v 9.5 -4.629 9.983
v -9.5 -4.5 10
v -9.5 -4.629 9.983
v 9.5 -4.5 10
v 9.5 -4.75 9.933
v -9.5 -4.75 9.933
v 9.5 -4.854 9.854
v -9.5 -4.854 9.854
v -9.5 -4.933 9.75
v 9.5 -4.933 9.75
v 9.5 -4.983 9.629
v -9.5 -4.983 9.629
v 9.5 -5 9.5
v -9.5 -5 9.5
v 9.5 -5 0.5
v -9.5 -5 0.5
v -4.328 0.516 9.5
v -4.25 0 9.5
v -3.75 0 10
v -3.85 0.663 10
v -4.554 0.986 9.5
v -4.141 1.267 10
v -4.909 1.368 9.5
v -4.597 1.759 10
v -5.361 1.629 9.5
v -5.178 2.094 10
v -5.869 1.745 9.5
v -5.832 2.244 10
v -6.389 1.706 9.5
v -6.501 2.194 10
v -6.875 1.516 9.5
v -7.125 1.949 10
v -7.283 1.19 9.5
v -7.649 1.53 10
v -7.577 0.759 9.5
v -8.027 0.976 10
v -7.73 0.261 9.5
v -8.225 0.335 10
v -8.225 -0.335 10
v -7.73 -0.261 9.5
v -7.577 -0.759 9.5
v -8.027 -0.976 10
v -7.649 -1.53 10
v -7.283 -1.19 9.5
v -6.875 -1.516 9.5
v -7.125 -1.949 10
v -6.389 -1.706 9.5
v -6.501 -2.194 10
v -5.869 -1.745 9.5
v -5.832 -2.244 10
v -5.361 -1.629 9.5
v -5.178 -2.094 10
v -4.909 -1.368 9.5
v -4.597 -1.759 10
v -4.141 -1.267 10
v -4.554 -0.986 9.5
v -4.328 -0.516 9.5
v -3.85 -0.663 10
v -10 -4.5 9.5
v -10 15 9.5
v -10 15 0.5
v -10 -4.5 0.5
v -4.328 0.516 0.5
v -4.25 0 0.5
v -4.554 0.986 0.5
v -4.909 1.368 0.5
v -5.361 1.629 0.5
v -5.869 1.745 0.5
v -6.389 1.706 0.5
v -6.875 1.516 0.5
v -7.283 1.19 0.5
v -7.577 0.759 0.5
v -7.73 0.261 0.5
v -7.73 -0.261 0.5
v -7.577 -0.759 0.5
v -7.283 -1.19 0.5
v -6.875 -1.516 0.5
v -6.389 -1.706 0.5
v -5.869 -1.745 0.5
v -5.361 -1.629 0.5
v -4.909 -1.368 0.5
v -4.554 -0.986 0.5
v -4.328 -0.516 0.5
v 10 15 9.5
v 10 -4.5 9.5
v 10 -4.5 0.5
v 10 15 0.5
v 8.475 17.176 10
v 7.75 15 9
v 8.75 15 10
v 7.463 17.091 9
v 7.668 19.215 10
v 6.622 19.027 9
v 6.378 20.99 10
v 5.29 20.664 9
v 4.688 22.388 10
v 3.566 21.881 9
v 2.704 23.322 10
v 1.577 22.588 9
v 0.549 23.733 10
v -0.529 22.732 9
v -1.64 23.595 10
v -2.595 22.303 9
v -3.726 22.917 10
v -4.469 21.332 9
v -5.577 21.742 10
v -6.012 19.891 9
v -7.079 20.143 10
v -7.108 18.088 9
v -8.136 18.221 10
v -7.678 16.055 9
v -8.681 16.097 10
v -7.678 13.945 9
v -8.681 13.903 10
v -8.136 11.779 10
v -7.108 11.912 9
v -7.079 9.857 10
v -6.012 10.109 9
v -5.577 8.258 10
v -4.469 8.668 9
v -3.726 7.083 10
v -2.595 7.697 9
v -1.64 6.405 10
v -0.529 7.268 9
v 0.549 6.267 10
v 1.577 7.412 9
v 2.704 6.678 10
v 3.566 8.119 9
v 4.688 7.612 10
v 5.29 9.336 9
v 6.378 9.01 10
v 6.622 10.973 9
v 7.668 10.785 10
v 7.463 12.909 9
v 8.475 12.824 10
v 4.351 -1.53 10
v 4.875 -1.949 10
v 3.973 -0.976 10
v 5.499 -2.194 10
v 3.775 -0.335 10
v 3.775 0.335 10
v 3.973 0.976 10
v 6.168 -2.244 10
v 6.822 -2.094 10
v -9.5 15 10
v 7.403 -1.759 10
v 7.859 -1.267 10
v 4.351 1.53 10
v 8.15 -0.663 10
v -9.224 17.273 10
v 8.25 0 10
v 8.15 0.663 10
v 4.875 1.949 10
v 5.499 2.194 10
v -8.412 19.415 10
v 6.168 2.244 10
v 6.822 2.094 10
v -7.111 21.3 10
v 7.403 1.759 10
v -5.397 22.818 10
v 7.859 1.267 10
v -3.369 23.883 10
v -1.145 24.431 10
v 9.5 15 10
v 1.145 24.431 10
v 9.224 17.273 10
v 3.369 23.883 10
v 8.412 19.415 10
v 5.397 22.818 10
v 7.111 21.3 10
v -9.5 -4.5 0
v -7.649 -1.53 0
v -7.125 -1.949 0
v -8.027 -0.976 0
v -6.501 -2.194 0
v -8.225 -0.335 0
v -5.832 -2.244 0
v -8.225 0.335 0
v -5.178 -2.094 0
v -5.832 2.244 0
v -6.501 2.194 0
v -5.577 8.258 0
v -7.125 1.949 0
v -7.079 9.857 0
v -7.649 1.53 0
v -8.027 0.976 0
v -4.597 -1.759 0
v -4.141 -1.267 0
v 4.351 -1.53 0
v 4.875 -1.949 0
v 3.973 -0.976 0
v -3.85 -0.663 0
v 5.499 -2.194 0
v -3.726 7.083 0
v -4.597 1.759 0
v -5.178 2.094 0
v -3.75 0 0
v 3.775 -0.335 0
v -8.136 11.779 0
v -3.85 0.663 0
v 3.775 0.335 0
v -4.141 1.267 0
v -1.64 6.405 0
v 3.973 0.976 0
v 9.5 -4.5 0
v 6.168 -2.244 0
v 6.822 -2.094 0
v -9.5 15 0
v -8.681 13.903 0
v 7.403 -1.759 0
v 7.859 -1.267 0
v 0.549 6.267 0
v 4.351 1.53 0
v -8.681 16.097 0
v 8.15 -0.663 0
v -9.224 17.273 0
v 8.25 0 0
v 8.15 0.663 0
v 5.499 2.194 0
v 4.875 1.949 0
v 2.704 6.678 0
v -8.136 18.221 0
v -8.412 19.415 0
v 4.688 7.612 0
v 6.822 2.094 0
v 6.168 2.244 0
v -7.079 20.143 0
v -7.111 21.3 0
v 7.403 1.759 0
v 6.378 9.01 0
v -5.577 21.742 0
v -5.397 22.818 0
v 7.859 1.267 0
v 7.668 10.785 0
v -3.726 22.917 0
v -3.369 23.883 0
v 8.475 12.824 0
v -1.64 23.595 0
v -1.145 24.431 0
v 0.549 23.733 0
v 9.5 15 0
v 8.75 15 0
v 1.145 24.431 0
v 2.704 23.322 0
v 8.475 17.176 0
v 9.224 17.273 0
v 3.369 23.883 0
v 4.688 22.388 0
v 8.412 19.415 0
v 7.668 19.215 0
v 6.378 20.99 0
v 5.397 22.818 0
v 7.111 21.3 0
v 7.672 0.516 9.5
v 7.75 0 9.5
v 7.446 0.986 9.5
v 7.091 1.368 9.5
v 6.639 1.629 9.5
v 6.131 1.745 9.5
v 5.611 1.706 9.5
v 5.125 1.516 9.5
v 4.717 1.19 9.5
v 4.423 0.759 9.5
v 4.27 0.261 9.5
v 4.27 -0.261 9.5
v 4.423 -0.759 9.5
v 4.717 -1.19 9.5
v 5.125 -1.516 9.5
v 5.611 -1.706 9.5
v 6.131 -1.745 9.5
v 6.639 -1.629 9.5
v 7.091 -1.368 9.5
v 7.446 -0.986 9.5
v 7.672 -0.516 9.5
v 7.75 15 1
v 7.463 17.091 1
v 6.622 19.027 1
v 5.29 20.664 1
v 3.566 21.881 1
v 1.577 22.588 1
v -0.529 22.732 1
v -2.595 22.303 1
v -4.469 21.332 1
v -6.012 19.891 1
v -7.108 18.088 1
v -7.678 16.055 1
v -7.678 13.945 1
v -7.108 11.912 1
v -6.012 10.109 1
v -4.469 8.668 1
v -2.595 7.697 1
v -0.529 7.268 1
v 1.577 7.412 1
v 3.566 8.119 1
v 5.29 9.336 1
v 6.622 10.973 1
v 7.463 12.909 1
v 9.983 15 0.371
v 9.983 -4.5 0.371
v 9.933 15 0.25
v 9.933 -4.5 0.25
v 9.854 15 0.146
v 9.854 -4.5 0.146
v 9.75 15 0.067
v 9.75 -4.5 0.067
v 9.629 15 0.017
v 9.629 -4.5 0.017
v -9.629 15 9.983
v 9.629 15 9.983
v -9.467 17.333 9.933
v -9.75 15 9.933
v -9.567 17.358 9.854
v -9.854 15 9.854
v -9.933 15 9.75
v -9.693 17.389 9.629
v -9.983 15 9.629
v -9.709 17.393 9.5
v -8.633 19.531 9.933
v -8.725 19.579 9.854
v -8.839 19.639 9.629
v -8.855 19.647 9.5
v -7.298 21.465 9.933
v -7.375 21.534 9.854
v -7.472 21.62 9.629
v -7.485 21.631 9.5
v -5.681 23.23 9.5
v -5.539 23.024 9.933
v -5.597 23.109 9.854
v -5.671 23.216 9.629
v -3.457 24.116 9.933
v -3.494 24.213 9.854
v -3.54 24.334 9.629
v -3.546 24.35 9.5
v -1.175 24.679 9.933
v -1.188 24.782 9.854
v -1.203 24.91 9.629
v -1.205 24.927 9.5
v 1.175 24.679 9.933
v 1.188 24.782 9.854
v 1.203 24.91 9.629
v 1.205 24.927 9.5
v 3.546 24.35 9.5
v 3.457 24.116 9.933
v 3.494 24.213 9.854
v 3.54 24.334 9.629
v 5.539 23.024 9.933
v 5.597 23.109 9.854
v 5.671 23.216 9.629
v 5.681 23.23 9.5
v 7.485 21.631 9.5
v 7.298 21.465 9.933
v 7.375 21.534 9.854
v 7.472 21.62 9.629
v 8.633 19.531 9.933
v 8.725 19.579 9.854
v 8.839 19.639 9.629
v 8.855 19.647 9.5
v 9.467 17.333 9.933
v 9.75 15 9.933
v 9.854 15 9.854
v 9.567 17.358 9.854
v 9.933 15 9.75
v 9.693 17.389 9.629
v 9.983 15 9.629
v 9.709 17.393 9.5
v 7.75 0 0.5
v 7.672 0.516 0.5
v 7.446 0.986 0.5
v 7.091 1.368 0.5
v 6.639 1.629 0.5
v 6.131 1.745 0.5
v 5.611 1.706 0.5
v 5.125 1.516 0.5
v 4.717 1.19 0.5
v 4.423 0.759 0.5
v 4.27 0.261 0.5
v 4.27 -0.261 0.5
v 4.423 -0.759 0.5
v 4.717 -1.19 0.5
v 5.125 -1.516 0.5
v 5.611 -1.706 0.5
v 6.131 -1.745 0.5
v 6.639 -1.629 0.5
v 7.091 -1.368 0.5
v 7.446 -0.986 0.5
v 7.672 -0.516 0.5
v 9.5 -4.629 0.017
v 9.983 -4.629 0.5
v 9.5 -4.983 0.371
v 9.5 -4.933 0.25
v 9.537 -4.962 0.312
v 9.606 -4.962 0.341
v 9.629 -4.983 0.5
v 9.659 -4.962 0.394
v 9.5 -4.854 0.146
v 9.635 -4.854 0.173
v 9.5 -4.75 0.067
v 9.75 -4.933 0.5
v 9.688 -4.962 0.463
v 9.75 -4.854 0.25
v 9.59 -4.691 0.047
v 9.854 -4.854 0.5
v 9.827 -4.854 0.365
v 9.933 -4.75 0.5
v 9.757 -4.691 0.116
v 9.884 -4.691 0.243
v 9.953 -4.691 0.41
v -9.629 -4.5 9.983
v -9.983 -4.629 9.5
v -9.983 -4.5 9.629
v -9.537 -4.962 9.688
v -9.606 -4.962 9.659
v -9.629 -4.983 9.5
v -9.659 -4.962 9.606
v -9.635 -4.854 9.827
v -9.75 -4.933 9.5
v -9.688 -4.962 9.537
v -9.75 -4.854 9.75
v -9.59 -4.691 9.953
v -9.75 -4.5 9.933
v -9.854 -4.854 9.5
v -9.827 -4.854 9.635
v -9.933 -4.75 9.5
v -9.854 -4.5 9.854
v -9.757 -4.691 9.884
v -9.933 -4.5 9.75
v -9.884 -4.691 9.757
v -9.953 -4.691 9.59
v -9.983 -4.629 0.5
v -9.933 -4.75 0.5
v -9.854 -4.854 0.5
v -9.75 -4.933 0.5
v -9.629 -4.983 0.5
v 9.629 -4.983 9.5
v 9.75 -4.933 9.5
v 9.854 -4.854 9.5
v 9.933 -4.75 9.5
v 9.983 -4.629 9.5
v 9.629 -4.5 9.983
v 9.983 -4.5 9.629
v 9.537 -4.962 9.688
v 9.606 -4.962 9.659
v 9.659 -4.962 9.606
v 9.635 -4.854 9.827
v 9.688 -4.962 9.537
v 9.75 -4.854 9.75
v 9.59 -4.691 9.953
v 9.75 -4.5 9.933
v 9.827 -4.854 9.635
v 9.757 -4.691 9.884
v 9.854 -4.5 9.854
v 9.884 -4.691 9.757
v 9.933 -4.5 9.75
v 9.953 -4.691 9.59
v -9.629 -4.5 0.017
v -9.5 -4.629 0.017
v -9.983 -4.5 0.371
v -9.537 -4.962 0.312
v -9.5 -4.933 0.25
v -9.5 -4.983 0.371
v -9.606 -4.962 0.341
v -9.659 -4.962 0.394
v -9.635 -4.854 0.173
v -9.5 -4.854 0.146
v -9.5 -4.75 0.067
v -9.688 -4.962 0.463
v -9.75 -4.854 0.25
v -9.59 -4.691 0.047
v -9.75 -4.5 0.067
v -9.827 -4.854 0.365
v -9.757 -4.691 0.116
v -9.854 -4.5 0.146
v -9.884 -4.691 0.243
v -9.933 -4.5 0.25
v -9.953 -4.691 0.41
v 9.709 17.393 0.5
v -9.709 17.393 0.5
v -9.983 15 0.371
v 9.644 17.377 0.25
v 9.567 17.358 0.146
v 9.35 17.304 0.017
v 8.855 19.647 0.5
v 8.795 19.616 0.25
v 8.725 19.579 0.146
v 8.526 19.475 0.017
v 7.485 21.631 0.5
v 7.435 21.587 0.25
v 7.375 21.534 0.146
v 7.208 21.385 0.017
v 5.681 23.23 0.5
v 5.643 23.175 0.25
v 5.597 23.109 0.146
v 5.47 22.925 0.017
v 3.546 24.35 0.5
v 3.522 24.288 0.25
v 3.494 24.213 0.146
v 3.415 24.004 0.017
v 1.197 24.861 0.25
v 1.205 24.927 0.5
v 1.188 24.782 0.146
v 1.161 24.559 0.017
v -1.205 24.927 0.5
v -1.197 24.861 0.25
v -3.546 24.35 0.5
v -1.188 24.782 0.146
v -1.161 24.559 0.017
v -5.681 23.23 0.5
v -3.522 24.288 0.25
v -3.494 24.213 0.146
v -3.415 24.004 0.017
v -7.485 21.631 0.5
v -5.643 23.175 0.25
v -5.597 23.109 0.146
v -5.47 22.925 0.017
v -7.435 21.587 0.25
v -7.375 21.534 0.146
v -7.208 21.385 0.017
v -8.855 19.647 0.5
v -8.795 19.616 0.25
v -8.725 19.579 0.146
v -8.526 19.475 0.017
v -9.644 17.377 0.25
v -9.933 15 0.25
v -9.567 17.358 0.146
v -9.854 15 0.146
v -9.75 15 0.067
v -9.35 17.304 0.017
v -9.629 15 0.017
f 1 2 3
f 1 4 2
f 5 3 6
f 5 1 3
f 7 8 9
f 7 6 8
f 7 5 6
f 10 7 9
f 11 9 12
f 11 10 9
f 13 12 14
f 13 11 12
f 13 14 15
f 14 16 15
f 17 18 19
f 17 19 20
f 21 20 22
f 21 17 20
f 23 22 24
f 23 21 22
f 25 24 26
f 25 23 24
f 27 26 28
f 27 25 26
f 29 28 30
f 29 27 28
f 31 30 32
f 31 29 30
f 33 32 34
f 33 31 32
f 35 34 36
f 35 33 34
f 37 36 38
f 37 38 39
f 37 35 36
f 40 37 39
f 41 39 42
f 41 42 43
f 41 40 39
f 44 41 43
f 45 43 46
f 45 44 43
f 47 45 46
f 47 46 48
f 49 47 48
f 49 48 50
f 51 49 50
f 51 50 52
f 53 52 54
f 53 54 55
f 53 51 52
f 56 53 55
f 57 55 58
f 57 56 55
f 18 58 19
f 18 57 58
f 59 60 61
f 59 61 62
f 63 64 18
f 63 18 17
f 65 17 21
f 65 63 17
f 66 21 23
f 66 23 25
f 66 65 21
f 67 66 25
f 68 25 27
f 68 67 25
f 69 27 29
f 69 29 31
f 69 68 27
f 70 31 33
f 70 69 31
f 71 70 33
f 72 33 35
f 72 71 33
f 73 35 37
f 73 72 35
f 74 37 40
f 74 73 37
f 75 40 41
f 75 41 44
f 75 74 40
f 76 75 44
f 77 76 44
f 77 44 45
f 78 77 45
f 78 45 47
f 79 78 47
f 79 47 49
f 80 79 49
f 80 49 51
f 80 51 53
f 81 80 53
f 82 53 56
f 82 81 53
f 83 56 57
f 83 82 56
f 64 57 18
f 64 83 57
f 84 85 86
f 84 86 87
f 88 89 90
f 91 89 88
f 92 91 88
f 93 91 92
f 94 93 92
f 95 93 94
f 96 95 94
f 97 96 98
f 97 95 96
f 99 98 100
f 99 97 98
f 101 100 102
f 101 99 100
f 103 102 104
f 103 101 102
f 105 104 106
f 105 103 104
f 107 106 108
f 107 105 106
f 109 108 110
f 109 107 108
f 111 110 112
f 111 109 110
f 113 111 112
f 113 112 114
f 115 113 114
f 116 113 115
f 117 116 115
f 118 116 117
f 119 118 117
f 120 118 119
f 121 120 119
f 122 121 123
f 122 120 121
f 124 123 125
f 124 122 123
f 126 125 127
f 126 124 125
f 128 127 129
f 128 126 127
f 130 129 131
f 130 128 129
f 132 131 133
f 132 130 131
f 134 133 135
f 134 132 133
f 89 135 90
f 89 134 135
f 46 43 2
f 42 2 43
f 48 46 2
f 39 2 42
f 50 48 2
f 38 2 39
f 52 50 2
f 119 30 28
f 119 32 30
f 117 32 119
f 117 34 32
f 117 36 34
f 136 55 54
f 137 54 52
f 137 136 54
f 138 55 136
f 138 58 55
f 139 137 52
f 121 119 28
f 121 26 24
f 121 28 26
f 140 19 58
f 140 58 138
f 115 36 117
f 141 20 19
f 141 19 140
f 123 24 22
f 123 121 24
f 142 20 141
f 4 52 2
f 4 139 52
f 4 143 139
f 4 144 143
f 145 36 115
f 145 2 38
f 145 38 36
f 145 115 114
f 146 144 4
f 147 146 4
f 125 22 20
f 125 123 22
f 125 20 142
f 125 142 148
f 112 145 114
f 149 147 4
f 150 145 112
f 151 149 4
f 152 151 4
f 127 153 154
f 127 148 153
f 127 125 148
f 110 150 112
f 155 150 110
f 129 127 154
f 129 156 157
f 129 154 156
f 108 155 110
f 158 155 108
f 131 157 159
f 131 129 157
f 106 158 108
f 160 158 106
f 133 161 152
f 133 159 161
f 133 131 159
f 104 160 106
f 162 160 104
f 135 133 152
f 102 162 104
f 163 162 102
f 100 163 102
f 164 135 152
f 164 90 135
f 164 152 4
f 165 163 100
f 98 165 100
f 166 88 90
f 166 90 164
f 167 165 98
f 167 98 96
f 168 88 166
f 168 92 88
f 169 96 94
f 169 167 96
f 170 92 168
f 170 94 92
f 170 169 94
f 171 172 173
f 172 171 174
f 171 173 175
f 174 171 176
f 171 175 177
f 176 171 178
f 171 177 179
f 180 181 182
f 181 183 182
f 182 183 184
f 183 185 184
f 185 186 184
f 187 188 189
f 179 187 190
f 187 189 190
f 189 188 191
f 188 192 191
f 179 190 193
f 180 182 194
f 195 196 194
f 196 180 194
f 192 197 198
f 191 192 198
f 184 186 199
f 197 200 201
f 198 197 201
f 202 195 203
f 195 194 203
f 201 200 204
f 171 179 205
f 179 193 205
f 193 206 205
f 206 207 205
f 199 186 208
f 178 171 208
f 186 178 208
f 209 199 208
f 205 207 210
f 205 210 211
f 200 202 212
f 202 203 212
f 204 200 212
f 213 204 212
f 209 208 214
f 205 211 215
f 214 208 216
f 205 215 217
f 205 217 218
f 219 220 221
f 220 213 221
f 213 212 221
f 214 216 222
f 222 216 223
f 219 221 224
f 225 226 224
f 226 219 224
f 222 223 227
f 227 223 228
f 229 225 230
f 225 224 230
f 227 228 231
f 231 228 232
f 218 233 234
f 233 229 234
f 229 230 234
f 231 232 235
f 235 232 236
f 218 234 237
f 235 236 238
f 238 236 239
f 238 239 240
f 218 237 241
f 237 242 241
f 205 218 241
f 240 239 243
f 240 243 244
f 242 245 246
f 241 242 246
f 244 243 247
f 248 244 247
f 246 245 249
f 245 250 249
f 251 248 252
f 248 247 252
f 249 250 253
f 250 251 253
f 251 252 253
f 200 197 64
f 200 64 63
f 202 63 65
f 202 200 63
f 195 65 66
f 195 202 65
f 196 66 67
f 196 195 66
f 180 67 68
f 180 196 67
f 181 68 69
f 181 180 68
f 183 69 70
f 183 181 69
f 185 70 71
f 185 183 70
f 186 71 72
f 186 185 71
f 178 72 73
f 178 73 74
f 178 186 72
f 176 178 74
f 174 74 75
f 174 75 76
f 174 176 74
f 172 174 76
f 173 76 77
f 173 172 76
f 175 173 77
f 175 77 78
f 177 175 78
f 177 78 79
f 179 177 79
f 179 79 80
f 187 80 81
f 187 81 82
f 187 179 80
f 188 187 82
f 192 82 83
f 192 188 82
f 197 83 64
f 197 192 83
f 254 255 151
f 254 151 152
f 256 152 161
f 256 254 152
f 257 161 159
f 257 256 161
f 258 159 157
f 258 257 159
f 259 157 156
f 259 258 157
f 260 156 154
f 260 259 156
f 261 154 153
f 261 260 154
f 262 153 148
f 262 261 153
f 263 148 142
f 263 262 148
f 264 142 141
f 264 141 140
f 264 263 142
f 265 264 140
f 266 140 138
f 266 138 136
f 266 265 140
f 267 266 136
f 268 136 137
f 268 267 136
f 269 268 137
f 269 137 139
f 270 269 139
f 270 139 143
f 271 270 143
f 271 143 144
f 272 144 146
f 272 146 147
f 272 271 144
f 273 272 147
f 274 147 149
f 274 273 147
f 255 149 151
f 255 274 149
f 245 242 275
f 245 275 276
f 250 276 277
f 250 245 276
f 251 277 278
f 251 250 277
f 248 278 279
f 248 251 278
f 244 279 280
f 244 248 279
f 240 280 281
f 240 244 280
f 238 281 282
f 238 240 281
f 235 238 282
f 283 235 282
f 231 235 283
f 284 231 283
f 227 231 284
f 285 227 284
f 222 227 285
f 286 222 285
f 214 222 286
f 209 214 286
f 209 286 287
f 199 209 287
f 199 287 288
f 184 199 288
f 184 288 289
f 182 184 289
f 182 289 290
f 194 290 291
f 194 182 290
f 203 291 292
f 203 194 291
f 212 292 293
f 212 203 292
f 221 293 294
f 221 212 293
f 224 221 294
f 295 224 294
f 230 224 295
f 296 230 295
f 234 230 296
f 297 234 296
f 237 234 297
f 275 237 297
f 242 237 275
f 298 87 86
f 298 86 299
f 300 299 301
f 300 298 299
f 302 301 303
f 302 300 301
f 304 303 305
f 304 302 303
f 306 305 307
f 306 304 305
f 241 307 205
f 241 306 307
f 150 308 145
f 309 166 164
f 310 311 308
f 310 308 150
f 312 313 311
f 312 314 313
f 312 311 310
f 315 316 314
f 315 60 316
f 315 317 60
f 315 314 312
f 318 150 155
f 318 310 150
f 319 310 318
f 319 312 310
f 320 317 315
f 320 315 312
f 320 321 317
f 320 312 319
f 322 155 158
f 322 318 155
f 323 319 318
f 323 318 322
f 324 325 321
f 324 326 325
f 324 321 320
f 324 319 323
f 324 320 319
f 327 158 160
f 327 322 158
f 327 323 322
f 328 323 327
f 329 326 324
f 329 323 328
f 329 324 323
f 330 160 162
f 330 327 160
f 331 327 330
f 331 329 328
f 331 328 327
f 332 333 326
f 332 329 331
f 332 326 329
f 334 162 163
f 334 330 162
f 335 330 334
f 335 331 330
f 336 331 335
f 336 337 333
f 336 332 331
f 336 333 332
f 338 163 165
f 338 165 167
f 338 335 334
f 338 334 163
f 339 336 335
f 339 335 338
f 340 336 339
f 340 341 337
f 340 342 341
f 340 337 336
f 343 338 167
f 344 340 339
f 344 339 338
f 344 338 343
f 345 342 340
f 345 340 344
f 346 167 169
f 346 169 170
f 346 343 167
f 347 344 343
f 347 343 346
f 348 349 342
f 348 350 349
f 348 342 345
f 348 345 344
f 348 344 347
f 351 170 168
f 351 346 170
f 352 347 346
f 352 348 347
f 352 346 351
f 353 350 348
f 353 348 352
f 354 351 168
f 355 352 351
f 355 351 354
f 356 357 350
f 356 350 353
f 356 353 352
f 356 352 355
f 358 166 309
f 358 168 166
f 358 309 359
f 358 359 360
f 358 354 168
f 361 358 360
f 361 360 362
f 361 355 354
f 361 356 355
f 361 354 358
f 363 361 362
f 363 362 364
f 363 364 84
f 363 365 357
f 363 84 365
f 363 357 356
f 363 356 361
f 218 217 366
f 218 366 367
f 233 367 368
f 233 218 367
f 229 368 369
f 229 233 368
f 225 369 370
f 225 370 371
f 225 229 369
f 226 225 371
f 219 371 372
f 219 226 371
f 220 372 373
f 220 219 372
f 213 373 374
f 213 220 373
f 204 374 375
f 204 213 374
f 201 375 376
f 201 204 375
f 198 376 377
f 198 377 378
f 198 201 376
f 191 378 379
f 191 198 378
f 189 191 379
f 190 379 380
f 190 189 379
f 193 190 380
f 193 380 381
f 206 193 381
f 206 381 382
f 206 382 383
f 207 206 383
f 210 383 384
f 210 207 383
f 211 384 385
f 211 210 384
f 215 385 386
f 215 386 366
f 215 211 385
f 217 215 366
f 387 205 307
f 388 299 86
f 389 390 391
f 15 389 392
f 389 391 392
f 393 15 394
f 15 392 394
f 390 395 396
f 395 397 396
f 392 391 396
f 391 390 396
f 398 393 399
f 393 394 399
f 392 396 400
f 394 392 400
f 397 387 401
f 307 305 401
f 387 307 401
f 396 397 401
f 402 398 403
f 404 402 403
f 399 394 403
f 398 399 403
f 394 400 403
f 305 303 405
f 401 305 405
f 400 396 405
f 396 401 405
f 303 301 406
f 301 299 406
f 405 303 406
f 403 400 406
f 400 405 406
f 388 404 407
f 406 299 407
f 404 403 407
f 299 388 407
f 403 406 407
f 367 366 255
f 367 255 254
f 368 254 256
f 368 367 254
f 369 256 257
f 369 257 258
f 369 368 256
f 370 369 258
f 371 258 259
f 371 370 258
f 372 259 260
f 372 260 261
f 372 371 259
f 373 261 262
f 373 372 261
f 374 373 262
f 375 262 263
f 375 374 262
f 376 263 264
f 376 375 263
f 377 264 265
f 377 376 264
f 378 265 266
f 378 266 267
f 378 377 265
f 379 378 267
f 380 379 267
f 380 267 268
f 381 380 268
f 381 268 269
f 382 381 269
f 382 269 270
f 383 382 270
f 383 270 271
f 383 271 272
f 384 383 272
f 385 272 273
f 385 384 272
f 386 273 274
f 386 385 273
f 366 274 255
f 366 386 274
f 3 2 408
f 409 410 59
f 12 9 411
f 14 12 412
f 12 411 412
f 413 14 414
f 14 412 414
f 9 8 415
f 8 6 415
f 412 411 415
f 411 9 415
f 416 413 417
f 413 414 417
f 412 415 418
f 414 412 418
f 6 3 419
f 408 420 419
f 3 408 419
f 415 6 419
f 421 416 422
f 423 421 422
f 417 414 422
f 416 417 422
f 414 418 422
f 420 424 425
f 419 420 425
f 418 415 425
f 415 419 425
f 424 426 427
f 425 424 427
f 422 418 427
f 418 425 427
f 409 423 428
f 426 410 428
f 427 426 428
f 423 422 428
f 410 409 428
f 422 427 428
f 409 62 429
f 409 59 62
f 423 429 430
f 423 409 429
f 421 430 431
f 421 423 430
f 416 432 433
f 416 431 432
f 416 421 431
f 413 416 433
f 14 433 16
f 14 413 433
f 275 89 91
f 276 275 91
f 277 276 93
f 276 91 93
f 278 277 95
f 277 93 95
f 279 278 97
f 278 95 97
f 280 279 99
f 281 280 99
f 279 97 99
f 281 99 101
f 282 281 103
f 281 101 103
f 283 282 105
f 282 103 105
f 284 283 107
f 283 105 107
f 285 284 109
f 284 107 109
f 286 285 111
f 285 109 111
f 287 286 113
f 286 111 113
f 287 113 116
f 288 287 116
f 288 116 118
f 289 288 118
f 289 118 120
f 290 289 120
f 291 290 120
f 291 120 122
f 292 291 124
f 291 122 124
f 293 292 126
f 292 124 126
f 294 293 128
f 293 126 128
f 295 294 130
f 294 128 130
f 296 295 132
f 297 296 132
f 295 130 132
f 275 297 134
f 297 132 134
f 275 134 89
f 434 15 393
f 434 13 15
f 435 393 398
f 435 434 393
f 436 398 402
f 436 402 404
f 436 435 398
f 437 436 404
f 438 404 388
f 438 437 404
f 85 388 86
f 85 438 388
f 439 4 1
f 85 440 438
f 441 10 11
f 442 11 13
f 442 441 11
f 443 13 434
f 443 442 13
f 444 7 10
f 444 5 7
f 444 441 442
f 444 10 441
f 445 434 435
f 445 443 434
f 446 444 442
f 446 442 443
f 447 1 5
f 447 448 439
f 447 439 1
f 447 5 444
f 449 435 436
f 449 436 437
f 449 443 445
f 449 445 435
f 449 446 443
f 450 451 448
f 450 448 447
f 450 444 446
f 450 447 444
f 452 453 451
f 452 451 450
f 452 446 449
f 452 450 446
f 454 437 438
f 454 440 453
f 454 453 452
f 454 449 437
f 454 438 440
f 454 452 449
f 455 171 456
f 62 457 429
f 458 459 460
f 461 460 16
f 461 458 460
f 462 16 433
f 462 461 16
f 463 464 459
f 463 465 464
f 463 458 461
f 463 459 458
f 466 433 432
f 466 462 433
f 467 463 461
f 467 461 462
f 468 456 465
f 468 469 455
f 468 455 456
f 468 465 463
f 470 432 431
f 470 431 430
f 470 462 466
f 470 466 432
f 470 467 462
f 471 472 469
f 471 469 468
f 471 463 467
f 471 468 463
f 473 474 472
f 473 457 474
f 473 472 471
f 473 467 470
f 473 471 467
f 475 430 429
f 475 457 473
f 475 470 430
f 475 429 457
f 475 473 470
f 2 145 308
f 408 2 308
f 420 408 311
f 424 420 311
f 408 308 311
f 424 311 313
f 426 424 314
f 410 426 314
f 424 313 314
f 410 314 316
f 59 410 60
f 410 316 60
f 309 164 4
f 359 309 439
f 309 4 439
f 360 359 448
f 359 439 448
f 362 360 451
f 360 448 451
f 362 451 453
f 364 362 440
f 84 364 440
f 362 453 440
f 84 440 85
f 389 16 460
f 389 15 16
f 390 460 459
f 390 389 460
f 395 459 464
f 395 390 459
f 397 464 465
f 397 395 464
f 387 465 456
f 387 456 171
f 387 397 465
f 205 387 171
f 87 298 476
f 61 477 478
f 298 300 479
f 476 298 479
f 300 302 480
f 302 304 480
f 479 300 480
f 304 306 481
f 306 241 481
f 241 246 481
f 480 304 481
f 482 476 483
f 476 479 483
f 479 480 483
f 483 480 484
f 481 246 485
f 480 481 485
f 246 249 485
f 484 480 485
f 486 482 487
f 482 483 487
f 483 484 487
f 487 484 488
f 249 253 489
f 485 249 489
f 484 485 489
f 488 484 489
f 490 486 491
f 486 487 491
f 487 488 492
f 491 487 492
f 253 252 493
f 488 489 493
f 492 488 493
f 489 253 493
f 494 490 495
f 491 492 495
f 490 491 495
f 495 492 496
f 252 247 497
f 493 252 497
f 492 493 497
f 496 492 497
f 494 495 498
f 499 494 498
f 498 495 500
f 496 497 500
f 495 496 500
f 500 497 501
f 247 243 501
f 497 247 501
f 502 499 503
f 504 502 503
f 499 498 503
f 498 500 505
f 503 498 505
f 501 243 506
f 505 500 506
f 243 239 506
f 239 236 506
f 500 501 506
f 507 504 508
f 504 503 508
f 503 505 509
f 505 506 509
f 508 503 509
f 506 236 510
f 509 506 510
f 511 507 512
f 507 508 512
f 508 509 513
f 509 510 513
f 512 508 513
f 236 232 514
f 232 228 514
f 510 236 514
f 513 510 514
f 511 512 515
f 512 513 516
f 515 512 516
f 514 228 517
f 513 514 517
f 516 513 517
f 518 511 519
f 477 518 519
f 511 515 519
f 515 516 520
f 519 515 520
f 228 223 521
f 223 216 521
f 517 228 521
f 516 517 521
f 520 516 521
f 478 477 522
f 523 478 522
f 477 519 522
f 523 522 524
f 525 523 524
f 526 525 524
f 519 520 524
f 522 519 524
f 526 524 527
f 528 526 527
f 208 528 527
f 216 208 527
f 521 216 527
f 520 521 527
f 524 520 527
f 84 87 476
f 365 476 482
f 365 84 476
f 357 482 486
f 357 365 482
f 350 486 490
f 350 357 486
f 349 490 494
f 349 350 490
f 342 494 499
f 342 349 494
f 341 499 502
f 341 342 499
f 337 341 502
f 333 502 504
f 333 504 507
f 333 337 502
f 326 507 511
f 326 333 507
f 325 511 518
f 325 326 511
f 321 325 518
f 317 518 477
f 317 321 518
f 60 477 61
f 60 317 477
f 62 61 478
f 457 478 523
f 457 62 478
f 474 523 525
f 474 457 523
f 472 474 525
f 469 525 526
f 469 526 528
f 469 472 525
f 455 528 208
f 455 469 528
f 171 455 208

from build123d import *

# Parameters (mm, degrees)
SKETCH_1_W      = 20
SKETCH_1_H      = 10
SKETCH_1_R      = 1.75
EXTRUDE_1_DEPTH = 10
SKETCH_2_R      = 7.75
EXTRUDE_2_DEPTH = 10
CHAMFER_1_SIZE  = 1
CHAMFER_2_SIZE  = 0.5
FILLET_1_R      = 0.5


with BuildPart() as part:
    # 草图1 → 凸台-拉伸1 (new body)
    with BuildSketch(Plane.XY):
        Rectangle(SKETCH_1_W, SKETCH_1_H)
        with Locations((-6, 0)):
            Circle(SKETCH_1_R, mode=Mode.SUBTRACT)
        with Locations((6, 0)):
            Circle(SKETCH_1_R, mode=Mode.SUBTRACT)
    extrude(amount=EXTRUDE_1_DEPTH)

    # 草图2 → 凸台-拉伸2 (add)
    with BuildSketch(Plane.XY.offset(10)):
        with BuildLine():
            Line((-10, 15), (-10, 5))
            Line((-10, 5), (10, 5))
            Line((10, 5), (10, 15))
            ThreePointArc((10, 15), (0, 25), (-10, 15))
        make_face()
        with Locations((0, 15)):
            Circle(SKETCH_2_R, mode=Mode.SUBTRACT)
    extrude(amount=-EXTRUDE_2_DEPTH)

    # 倒角1
    chamfer_1_edges = [part.edges().sort_by_distance(p)[0] for p in [
        (-7.75, 15, 10),
        (-7.75, 15, 0),
    ]]
    chamfer(chamfer_1_edges, length=CHAMFER_1_SIZE)

    # 倒角2
    chamfer_2_edges = [part.edges().sort_by_distance(p)[0] for p in [
        (-7.75, 0, 0),
        (-7.75, 0, 10),
        (4.25, 0, 0),
        (4.25, 0, 10),
    ]]
    chamfer(chamfer_2_edges, length=CHAMFER_2_SIZE)

    # 圆角1
    fillet_1_edges = [part.edges().sort_by_distance(p)[0] for p in [
        (-10, 5, 10),
        (0, -5, 10),
        (0, 25, 0),
        (0, 25, 10),
        (10, 5, 10),
        (0, -5, 0),
        (-10, 5, 0),
        (10, 5, 0),
        (10, -5, 5),
        (-10, -5, 5),
    ]]
    fillet(fillet_1_edges, radius=FILLET_1_R)


solid = part.part
